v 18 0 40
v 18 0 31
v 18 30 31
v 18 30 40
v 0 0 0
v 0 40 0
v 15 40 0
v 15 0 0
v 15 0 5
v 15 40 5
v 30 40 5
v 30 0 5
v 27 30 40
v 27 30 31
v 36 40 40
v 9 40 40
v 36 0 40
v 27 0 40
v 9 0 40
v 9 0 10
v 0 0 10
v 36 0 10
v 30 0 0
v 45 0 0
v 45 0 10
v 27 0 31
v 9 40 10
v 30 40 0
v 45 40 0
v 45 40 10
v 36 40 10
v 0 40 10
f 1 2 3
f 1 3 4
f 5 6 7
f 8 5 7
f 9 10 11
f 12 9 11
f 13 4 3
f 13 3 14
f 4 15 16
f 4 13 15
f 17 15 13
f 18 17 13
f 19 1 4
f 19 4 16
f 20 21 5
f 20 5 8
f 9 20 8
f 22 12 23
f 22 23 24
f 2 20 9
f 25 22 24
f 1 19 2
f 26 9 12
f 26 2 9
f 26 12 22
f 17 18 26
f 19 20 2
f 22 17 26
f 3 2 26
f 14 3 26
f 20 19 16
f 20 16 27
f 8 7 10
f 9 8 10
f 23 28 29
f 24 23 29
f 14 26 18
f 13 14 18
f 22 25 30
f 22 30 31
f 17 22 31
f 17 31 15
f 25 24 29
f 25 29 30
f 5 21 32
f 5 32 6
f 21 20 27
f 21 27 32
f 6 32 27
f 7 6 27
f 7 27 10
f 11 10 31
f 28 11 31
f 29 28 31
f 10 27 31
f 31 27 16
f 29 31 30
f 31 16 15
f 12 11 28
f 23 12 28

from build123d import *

# Parameters (mm, degrees)
F0_W     = 9
F0_H     = 9
F1_DEPTH = 40
F2_DEPTH = 30


with BuildPart() as f1:
    # F0 (on Front) → F1 (new body)
    with BuildSketch(Plane.XZ):
        with Locations((22.5, 35.5)):
            Rectangle(F0_W, F0_H)
        Polygon((0, 10), (0, 0), (15, 0), (15, 5), (30, 5), (30, 0), (45, 0), (45, 10), (36, 10), (36, 40), (27, 40), (27, 31), (18, 31), (18, 40), (9, 40), (9, 10), align=None)
    extrude(amount=-F1_DEPTH)

    # F0 (on Front) → F2 (cut)
    with BuildSketch(Plane.XZ):
        with Locations((22.5, 35.5)):
            Rectangle(F0_W, F0_H)
    extrude(amount=-F2_DEPTH, mode=Mode.SUBTRACT)


solid = f1.part
